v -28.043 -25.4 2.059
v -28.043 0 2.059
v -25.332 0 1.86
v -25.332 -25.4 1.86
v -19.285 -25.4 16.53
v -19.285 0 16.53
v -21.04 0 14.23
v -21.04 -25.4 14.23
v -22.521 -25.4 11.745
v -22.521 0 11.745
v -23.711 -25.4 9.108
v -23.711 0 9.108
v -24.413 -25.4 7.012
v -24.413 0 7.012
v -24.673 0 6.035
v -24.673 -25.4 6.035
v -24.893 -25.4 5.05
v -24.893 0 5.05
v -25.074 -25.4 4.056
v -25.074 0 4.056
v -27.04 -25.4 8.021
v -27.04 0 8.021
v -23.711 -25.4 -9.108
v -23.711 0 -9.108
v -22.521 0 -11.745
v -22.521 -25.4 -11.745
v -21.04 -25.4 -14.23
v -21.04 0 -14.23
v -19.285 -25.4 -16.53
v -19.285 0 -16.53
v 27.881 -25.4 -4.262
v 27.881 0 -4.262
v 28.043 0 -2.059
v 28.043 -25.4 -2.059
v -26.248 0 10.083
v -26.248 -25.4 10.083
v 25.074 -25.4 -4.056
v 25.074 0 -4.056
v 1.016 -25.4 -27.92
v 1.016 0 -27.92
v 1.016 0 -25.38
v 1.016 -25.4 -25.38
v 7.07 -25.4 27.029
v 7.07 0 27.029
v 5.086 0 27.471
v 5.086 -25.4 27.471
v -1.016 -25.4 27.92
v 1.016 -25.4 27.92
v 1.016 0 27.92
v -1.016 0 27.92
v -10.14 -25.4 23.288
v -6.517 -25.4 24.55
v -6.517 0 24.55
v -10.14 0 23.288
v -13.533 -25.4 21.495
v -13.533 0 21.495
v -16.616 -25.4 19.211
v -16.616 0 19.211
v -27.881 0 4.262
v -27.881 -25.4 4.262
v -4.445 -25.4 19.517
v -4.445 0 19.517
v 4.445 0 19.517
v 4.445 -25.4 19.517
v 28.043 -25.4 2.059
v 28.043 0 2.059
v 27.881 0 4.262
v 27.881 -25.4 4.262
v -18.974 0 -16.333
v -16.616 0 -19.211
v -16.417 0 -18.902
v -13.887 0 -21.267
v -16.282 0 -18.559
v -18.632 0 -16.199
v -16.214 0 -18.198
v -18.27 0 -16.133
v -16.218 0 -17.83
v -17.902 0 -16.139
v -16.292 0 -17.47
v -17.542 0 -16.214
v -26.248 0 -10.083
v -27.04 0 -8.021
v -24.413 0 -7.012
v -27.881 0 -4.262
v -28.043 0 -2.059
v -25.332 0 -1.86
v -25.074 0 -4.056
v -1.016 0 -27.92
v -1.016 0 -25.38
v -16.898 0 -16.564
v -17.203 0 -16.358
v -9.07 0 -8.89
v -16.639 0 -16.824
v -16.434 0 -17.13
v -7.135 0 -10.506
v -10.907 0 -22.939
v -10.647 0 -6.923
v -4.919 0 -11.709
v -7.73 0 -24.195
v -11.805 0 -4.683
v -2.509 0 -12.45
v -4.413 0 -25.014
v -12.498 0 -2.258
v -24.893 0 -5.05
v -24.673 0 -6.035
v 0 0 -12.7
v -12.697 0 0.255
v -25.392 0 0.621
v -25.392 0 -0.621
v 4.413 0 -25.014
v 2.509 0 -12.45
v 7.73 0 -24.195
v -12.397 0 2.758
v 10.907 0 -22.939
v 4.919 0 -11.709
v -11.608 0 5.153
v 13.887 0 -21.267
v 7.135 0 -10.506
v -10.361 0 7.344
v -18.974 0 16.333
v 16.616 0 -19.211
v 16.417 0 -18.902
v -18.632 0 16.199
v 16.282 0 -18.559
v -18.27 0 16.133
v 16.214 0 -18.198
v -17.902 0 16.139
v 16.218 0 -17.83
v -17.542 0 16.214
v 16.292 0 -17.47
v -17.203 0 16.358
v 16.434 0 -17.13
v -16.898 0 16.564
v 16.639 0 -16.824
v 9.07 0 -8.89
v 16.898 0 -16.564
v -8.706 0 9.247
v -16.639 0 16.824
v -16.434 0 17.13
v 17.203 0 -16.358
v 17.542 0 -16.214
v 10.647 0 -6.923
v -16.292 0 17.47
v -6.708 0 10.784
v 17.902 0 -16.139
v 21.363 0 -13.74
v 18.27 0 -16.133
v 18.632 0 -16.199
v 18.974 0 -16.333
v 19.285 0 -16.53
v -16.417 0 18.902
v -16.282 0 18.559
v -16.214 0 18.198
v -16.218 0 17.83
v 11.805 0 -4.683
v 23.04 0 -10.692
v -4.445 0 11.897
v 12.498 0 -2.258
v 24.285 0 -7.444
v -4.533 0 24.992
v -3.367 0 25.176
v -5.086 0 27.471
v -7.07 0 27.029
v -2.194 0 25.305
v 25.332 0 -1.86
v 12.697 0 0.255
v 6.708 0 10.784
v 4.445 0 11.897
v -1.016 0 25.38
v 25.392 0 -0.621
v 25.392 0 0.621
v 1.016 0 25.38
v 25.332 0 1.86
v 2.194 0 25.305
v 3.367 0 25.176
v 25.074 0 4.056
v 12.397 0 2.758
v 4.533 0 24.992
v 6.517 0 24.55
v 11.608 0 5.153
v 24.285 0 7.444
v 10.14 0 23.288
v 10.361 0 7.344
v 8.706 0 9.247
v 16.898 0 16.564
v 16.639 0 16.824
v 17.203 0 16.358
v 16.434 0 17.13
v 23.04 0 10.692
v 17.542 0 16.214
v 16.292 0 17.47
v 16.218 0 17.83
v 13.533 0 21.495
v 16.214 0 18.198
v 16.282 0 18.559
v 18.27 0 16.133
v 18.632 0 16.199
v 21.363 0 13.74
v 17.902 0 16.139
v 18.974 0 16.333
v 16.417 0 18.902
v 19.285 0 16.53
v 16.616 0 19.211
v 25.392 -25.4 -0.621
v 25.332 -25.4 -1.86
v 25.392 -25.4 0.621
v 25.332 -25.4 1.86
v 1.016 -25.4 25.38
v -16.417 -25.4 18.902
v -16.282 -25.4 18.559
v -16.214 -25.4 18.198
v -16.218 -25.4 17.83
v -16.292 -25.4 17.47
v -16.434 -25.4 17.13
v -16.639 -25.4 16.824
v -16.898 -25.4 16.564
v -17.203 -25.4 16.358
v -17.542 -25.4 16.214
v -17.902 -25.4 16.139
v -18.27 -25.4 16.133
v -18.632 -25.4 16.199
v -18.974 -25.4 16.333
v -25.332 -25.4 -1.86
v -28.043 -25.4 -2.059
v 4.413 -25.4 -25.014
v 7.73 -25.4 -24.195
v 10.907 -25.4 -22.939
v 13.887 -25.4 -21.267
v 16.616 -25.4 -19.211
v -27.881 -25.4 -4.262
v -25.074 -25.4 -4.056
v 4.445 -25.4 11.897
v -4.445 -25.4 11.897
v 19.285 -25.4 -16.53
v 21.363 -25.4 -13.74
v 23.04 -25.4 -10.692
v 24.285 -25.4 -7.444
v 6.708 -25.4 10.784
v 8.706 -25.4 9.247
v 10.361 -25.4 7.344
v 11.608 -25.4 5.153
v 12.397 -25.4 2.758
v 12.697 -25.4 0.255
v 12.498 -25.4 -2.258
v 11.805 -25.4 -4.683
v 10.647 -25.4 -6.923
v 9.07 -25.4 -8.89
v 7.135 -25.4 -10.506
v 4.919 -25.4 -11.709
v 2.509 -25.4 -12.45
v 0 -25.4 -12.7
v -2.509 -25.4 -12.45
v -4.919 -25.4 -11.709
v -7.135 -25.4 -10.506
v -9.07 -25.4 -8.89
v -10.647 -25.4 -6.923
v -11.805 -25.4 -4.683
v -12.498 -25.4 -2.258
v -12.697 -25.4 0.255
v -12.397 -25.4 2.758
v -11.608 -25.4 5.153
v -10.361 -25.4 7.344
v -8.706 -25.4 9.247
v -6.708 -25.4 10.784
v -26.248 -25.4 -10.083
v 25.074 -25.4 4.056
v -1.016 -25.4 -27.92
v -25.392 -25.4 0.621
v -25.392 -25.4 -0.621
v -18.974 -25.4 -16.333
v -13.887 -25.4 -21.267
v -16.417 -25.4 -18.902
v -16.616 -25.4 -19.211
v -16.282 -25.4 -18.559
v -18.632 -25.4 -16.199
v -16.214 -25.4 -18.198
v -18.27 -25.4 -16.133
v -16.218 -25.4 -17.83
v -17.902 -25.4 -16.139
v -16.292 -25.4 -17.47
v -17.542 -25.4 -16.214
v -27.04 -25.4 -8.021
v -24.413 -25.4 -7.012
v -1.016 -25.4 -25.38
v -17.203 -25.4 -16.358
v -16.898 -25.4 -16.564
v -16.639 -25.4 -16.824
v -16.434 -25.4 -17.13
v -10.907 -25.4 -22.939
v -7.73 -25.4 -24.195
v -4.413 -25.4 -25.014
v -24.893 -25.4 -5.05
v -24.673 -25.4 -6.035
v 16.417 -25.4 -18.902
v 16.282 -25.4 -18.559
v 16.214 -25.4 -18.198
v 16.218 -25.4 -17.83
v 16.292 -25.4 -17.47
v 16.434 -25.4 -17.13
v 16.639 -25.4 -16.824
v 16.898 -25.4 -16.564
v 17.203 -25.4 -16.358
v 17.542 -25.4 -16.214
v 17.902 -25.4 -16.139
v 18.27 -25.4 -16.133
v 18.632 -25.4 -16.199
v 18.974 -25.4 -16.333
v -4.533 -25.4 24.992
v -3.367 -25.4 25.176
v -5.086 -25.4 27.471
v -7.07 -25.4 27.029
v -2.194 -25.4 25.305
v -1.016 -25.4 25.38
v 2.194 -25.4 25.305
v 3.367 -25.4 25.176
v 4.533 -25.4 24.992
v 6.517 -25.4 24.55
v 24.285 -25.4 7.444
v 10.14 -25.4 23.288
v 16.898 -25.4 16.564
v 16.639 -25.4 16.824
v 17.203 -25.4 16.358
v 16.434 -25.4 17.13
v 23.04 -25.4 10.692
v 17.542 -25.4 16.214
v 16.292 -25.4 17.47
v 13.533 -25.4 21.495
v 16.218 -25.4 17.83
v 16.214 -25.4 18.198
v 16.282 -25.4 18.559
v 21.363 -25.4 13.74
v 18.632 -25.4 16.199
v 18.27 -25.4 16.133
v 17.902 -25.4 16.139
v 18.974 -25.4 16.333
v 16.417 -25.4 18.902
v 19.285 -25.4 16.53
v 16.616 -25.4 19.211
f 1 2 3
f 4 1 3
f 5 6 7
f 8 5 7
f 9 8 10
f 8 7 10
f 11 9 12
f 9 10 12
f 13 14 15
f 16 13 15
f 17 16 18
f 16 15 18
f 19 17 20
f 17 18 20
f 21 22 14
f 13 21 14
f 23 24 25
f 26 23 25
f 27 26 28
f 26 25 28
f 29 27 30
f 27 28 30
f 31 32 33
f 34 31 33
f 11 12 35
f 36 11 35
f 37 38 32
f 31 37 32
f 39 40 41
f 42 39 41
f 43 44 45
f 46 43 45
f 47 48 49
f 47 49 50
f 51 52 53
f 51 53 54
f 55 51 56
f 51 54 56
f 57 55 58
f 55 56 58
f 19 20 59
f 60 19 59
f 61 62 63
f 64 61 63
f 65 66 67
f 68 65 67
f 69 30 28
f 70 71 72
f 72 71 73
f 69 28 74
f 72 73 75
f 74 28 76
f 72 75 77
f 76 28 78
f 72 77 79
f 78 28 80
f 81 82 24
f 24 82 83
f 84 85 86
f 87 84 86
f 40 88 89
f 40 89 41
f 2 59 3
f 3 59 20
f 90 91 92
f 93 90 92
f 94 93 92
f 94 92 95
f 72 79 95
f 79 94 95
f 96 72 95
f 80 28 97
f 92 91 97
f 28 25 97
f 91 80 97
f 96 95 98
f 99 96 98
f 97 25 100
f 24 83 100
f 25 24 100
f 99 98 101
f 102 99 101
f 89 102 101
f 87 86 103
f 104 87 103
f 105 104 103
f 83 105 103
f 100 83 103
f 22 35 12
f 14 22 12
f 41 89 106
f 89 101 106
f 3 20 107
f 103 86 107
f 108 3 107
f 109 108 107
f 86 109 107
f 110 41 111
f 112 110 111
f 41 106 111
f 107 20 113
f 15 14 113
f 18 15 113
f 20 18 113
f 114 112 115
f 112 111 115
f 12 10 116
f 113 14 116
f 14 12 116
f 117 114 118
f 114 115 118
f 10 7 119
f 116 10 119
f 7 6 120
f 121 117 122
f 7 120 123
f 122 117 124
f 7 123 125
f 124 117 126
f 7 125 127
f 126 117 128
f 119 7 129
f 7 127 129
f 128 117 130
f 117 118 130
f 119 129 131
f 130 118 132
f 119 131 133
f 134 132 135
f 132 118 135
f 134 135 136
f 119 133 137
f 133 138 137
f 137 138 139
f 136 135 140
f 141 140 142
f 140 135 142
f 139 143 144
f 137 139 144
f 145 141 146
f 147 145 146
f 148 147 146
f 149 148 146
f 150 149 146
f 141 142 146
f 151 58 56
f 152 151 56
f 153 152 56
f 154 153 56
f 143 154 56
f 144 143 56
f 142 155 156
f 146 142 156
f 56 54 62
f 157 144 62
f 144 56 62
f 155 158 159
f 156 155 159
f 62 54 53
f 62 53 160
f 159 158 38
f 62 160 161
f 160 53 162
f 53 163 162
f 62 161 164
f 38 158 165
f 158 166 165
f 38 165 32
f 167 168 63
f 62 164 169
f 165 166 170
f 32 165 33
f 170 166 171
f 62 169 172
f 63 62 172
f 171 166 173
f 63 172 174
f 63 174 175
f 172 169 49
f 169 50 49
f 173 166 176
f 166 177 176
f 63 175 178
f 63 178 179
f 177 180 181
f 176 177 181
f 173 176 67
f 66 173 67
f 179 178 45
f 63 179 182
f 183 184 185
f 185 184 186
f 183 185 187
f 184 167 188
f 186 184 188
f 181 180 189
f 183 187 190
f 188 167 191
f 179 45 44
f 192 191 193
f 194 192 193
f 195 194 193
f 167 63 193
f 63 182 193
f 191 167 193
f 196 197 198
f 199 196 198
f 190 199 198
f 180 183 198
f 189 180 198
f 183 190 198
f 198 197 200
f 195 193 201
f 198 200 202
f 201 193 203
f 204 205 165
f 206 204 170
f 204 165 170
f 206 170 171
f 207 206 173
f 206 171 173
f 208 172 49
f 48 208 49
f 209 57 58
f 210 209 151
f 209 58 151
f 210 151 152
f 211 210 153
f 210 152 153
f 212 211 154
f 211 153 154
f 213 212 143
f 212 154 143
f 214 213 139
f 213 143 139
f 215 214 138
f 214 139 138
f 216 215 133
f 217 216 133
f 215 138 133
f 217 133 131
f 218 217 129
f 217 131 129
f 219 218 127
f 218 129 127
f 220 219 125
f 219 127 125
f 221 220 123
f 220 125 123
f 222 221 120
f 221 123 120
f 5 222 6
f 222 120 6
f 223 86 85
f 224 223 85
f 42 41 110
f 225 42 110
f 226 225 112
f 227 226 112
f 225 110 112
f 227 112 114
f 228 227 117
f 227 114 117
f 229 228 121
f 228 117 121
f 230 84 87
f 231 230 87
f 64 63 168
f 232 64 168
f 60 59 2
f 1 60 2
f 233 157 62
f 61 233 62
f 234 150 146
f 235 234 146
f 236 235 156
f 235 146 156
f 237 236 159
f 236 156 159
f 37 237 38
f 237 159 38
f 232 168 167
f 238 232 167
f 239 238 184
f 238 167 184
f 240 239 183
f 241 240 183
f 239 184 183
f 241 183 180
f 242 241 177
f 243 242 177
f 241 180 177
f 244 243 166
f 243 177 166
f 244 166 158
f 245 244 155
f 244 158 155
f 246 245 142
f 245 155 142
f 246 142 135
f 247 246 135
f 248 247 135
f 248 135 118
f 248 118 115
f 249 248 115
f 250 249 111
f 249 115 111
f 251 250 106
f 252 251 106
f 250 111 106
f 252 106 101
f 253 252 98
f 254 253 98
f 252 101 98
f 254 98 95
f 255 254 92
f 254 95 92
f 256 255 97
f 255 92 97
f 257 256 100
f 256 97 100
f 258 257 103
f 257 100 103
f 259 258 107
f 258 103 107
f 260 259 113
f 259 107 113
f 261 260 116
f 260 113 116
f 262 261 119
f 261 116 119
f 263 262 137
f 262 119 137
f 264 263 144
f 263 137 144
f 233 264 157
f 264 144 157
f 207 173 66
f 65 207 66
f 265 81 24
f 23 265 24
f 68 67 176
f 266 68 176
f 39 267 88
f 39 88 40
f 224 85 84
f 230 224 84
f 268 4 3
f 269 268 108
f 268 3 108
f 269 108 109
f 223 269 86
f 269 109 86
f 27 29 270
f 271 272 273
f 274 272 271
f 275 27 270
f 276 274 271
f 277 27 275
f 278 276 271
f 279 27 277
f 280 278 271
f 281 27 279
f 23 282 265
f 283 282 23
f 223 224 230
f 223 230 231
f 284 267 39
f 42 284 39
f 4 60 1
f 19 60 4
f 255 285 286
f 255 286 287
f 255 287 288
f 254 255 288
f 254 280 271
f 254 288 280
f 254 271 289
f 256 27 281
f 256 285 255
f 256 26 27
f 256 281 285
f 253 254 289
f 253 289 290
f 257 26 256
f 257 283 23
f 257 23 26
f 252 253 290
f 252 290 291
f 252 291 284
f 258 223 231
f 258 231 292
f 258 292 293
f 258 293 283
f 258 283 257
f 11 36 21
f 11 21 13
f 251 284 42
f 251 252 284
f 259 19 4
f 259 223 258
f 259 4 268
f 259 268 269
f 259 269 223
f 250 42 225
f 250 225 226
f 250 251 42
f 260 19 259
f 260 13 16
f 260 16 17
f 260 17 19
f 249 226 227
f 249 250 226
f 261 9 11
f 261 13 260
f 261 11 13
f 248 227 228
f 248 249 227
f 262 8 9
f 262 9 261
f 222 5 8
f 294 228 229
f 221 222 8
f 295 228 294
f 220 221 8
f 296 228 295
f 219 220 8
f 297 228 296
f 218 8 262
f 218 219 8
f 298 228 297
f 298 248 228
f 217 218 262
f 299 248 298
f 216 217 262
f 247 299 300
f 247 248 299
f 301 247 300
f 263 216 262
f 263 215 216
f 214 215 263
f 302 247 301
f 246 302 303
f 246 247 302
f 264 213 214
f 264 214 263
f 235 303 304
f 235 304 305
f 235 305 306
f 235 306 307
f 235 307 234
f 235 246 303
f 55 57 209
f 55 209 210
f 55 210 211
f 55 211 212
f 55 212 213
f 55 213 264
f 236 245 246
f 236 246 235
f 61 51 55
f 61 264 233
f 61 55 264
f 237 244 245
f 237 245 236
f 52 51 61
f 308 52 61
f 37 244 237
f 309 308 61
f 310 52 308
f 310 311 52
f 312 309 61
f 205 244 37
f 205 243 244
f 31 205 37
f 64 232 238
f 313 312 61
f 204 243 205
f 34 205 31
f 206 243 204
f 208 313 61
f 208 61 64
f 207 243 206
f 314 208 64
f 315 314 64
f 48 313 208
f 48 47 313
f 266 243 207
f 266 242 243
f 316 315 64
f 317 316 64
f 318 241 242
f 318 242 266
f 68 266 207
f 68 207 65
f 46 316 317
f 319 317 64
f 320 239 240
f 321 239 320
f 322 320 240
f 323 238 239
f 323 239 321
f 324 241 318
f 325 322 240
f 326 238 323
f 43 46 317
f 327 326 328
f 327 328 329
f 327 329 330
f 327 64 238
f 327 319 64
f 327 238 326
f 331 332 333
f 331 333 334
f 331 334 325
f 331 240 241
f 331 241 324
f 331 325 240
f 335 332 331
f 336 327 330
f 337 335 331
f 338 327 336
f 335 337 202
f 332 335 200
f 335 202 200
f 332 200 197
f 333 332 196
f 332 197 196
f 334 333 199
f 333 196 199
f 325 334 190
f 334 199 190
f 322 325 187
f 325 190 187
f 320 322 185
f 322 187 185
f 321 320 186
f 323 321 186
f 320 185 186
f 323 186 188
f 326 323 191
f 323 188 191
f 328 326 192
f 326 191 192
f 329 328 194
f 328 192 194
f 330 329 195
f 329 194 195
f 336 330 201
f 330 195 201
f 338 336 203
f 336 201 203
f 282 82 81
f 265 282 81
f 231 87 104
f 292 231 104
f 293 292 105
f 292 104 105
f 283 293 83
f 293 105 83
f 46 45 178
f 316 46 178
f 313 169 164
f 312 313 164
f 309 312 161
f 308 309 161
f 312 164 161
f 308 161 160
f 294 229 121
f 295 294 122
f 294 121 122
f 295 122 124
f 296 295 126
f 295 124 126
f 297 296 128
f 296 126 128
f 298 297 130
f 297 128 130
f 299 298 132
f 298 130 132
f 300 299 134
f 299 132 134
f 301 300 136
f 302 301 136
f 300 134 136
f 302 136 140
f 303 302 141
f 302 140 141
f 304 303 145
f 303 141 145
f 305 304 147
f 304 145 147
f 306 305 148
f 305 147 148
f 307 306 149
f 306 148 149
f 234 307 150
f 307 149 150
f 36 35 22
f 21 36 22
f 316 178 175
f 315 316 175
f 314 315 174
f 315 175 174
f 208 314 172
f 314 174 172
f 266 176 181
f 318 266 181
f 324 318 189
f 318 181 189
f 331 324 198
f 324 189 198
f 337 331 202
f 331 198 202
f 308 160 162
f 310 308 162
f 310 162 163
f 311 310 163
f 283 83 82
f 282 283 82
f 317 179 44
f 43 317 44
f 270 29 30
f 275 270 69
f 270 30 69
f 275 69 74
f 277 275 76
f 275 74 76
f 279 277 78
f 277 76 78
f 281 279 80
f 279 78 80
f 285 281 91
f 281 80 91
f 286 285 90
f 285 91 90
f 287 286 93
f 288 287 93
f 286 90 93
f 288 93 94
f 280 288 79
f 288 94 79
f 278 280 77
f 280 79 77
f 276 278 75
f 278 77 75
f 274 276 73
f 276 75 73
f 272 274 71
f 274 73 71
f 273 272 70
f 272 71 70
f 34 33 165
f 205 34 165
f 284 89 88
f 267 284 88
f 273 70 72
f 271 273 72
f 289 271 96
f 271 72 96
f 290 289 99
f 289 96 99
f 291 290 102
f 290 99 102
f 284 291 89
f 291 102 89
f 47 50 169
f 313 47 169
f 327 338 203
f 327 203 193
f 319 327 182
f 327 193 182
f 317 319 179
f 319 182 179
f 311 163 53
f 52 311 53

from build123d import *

# Parameters (mm, degrees)
F1_DEPTH = 25.4


with BuildPart() as f1:
    # F0 (on Front) → F1 (new body)
    with BuildSketch(Plane.XZ):
        with BuildLine():
            ThreePointArc((19.284791, 16.530482), (16.762226, 16.687837), (16.616092, 19.211078))
            ThreePointArc((16.616092, 19.211078), (11.870376, 22.455605), (6.516592, 24.549828))
            Line((6.516592, 24.549828), (7.06953, 27.028912))
            Line((7.06953, 27.028912), (5.086263, 27.471263))
            Line((5.086263, 27.471263), (4.533324, 24.992178))
            ThreePointArc((4.533324, 24.992178), (2.781418, 25.247252), (1.016, 25.379672))
            Line((1.016, 25.379672), (1.016, 27.919672))
            Line((1.016, 27.919672), (-1.016, 27.919672))
            Line((-1.016, 27.919672), (-1.016, 25.379672))
            ThreePointArc((-1.016, 25.379672), (-2.781418, 25.247252), (-4.533324, 24.992178))
            Line((-4.533324, 24.992178), (-5.086263, 27.471263))
            Line((-5.086263, 27.471263), (-7.06953, 27.028912))
            Line((-7.06953, 27.028912), (-6.516592, 24.549828))
            ThreePointArc((-6.516592, 24.549828), (-11.870376, 22.455605), (-16.616092, 19.211078))
            ThreePointArc((-16.616092, 19.211078), (-16.762226, 16.687837), (-19.284791, 16.530482))
            ThreePointArc((-19.284791, 16.530482), (-21.815816, 13.00885), (-23.710856, 9.107979))
            Line((-23.710856, 9.107979), (-26.248305, 10.082682))
            Line((-26.248305, 10.082682), (-27.040335, 8.020787))
            Line((-27.040335, 8.020787), (-24.413065, 7.011581))
            ThreePointArc((-24.413065, 7.011581), (-24.787675, 5.543569), (-25.074094, 4.055834))
            Line((-25.074094, 4.055834), (-27.880973, 4.261933))
            Line((-27.880973, 4.261933), (-28.042721, 2.059081))
            Line((-28.042721, 2.059081), (-25.331804, 1.860028))
            ThreePointArc((-25.331804, 1.860028), (-25.4, 0), (-25.331804, -1.860028))
            Line((-25.331804, -1.860028), (-28.042721, -2.059081))
            Line((-28.042721, -2.059081), (-27.880973, -4.261933))
            Line((-27.880973, -4.261933), (-25.074094, -4.055834))
            ThreePointArc((-25.074094, -4.055834), (-24.787675, -5.543569), (-24.413065, -7.011581))
            Line((-24.413065, -7.011581), (-27.040335, -8.020787))
            Line((-27.040335, -8.020787), (-26.248305, -10.082682))
            Line((-26.248305, -10.082682), (-23.710856, -9.107979))
            ThreePointArc((-23.710856, -9.107979), (-21.815816, -13.00885), (-19.284791, -16.530482))
            ThreePointArc((-19.284791, -16.530482), (-16.762226, -16.687837), (-16.616092, -19.211078))
            ThreePointArc((-16.616092, -19.211078), (-9.339997, -23.620424), (-1.016, -25.379672))
            Line((-1.016, -25.379672), (-1.016, -27.919672))
            Line((-1.016, -27.919672), (1.016, -27.919672))
            Line((1.016, -27.919672), (1.016, -25.379672))
            ThreePointArc((1.016, -25.379672), (9.339997, -23.620424), (16.616092, -19.211078))
            ThreePointArc((16.616092, -19.211078), (16.762226, -16.687837), (19.284791, -16.530482))
            ThreePointArc((19.284791, -16.530482), (23.039789, -10.692432), (25.074094, -4.055834))
            Line((25.074094, -4.055834), (27.880973, -4.261933))
            Line((27.880973, -4.261933), (28.042721, -2.059081))
            Line((28.042721, -2.059081), (25.331804, -1.860028))
            ThreePointArc((25.331804, -1.860028), (25.4, 0), (25.331804, 1.860028))
            Line((25.331804, 1.860028), (28.042721, 2.059081))
            Line((28.042721, 2.059081), (27.880973, 4.261933))
            Line((27.880973, 4.261933), (25.074094, 4.055834))
            ThreePointArc((25.074094, 4.055834), (23.039789, 10.692432), (19.284791, 16.530482))
        make_face()
        with BuildLine():
            ThreePointArc((4.445, 11.896721), (0, -12.7), (-4.445, 11.896721))
            Line((-4.445, 11.896721), (-4.445, 19.516721))
            Line((-4.445, 19.516721), (4.445, 19.516721))
            Line((4.445, 19.516721), (4.445, 11.896721))
        make_face(mode=Mode.SUBTRACT)
    extrude(amount=F1_DEPTH)


solid = f1.part
